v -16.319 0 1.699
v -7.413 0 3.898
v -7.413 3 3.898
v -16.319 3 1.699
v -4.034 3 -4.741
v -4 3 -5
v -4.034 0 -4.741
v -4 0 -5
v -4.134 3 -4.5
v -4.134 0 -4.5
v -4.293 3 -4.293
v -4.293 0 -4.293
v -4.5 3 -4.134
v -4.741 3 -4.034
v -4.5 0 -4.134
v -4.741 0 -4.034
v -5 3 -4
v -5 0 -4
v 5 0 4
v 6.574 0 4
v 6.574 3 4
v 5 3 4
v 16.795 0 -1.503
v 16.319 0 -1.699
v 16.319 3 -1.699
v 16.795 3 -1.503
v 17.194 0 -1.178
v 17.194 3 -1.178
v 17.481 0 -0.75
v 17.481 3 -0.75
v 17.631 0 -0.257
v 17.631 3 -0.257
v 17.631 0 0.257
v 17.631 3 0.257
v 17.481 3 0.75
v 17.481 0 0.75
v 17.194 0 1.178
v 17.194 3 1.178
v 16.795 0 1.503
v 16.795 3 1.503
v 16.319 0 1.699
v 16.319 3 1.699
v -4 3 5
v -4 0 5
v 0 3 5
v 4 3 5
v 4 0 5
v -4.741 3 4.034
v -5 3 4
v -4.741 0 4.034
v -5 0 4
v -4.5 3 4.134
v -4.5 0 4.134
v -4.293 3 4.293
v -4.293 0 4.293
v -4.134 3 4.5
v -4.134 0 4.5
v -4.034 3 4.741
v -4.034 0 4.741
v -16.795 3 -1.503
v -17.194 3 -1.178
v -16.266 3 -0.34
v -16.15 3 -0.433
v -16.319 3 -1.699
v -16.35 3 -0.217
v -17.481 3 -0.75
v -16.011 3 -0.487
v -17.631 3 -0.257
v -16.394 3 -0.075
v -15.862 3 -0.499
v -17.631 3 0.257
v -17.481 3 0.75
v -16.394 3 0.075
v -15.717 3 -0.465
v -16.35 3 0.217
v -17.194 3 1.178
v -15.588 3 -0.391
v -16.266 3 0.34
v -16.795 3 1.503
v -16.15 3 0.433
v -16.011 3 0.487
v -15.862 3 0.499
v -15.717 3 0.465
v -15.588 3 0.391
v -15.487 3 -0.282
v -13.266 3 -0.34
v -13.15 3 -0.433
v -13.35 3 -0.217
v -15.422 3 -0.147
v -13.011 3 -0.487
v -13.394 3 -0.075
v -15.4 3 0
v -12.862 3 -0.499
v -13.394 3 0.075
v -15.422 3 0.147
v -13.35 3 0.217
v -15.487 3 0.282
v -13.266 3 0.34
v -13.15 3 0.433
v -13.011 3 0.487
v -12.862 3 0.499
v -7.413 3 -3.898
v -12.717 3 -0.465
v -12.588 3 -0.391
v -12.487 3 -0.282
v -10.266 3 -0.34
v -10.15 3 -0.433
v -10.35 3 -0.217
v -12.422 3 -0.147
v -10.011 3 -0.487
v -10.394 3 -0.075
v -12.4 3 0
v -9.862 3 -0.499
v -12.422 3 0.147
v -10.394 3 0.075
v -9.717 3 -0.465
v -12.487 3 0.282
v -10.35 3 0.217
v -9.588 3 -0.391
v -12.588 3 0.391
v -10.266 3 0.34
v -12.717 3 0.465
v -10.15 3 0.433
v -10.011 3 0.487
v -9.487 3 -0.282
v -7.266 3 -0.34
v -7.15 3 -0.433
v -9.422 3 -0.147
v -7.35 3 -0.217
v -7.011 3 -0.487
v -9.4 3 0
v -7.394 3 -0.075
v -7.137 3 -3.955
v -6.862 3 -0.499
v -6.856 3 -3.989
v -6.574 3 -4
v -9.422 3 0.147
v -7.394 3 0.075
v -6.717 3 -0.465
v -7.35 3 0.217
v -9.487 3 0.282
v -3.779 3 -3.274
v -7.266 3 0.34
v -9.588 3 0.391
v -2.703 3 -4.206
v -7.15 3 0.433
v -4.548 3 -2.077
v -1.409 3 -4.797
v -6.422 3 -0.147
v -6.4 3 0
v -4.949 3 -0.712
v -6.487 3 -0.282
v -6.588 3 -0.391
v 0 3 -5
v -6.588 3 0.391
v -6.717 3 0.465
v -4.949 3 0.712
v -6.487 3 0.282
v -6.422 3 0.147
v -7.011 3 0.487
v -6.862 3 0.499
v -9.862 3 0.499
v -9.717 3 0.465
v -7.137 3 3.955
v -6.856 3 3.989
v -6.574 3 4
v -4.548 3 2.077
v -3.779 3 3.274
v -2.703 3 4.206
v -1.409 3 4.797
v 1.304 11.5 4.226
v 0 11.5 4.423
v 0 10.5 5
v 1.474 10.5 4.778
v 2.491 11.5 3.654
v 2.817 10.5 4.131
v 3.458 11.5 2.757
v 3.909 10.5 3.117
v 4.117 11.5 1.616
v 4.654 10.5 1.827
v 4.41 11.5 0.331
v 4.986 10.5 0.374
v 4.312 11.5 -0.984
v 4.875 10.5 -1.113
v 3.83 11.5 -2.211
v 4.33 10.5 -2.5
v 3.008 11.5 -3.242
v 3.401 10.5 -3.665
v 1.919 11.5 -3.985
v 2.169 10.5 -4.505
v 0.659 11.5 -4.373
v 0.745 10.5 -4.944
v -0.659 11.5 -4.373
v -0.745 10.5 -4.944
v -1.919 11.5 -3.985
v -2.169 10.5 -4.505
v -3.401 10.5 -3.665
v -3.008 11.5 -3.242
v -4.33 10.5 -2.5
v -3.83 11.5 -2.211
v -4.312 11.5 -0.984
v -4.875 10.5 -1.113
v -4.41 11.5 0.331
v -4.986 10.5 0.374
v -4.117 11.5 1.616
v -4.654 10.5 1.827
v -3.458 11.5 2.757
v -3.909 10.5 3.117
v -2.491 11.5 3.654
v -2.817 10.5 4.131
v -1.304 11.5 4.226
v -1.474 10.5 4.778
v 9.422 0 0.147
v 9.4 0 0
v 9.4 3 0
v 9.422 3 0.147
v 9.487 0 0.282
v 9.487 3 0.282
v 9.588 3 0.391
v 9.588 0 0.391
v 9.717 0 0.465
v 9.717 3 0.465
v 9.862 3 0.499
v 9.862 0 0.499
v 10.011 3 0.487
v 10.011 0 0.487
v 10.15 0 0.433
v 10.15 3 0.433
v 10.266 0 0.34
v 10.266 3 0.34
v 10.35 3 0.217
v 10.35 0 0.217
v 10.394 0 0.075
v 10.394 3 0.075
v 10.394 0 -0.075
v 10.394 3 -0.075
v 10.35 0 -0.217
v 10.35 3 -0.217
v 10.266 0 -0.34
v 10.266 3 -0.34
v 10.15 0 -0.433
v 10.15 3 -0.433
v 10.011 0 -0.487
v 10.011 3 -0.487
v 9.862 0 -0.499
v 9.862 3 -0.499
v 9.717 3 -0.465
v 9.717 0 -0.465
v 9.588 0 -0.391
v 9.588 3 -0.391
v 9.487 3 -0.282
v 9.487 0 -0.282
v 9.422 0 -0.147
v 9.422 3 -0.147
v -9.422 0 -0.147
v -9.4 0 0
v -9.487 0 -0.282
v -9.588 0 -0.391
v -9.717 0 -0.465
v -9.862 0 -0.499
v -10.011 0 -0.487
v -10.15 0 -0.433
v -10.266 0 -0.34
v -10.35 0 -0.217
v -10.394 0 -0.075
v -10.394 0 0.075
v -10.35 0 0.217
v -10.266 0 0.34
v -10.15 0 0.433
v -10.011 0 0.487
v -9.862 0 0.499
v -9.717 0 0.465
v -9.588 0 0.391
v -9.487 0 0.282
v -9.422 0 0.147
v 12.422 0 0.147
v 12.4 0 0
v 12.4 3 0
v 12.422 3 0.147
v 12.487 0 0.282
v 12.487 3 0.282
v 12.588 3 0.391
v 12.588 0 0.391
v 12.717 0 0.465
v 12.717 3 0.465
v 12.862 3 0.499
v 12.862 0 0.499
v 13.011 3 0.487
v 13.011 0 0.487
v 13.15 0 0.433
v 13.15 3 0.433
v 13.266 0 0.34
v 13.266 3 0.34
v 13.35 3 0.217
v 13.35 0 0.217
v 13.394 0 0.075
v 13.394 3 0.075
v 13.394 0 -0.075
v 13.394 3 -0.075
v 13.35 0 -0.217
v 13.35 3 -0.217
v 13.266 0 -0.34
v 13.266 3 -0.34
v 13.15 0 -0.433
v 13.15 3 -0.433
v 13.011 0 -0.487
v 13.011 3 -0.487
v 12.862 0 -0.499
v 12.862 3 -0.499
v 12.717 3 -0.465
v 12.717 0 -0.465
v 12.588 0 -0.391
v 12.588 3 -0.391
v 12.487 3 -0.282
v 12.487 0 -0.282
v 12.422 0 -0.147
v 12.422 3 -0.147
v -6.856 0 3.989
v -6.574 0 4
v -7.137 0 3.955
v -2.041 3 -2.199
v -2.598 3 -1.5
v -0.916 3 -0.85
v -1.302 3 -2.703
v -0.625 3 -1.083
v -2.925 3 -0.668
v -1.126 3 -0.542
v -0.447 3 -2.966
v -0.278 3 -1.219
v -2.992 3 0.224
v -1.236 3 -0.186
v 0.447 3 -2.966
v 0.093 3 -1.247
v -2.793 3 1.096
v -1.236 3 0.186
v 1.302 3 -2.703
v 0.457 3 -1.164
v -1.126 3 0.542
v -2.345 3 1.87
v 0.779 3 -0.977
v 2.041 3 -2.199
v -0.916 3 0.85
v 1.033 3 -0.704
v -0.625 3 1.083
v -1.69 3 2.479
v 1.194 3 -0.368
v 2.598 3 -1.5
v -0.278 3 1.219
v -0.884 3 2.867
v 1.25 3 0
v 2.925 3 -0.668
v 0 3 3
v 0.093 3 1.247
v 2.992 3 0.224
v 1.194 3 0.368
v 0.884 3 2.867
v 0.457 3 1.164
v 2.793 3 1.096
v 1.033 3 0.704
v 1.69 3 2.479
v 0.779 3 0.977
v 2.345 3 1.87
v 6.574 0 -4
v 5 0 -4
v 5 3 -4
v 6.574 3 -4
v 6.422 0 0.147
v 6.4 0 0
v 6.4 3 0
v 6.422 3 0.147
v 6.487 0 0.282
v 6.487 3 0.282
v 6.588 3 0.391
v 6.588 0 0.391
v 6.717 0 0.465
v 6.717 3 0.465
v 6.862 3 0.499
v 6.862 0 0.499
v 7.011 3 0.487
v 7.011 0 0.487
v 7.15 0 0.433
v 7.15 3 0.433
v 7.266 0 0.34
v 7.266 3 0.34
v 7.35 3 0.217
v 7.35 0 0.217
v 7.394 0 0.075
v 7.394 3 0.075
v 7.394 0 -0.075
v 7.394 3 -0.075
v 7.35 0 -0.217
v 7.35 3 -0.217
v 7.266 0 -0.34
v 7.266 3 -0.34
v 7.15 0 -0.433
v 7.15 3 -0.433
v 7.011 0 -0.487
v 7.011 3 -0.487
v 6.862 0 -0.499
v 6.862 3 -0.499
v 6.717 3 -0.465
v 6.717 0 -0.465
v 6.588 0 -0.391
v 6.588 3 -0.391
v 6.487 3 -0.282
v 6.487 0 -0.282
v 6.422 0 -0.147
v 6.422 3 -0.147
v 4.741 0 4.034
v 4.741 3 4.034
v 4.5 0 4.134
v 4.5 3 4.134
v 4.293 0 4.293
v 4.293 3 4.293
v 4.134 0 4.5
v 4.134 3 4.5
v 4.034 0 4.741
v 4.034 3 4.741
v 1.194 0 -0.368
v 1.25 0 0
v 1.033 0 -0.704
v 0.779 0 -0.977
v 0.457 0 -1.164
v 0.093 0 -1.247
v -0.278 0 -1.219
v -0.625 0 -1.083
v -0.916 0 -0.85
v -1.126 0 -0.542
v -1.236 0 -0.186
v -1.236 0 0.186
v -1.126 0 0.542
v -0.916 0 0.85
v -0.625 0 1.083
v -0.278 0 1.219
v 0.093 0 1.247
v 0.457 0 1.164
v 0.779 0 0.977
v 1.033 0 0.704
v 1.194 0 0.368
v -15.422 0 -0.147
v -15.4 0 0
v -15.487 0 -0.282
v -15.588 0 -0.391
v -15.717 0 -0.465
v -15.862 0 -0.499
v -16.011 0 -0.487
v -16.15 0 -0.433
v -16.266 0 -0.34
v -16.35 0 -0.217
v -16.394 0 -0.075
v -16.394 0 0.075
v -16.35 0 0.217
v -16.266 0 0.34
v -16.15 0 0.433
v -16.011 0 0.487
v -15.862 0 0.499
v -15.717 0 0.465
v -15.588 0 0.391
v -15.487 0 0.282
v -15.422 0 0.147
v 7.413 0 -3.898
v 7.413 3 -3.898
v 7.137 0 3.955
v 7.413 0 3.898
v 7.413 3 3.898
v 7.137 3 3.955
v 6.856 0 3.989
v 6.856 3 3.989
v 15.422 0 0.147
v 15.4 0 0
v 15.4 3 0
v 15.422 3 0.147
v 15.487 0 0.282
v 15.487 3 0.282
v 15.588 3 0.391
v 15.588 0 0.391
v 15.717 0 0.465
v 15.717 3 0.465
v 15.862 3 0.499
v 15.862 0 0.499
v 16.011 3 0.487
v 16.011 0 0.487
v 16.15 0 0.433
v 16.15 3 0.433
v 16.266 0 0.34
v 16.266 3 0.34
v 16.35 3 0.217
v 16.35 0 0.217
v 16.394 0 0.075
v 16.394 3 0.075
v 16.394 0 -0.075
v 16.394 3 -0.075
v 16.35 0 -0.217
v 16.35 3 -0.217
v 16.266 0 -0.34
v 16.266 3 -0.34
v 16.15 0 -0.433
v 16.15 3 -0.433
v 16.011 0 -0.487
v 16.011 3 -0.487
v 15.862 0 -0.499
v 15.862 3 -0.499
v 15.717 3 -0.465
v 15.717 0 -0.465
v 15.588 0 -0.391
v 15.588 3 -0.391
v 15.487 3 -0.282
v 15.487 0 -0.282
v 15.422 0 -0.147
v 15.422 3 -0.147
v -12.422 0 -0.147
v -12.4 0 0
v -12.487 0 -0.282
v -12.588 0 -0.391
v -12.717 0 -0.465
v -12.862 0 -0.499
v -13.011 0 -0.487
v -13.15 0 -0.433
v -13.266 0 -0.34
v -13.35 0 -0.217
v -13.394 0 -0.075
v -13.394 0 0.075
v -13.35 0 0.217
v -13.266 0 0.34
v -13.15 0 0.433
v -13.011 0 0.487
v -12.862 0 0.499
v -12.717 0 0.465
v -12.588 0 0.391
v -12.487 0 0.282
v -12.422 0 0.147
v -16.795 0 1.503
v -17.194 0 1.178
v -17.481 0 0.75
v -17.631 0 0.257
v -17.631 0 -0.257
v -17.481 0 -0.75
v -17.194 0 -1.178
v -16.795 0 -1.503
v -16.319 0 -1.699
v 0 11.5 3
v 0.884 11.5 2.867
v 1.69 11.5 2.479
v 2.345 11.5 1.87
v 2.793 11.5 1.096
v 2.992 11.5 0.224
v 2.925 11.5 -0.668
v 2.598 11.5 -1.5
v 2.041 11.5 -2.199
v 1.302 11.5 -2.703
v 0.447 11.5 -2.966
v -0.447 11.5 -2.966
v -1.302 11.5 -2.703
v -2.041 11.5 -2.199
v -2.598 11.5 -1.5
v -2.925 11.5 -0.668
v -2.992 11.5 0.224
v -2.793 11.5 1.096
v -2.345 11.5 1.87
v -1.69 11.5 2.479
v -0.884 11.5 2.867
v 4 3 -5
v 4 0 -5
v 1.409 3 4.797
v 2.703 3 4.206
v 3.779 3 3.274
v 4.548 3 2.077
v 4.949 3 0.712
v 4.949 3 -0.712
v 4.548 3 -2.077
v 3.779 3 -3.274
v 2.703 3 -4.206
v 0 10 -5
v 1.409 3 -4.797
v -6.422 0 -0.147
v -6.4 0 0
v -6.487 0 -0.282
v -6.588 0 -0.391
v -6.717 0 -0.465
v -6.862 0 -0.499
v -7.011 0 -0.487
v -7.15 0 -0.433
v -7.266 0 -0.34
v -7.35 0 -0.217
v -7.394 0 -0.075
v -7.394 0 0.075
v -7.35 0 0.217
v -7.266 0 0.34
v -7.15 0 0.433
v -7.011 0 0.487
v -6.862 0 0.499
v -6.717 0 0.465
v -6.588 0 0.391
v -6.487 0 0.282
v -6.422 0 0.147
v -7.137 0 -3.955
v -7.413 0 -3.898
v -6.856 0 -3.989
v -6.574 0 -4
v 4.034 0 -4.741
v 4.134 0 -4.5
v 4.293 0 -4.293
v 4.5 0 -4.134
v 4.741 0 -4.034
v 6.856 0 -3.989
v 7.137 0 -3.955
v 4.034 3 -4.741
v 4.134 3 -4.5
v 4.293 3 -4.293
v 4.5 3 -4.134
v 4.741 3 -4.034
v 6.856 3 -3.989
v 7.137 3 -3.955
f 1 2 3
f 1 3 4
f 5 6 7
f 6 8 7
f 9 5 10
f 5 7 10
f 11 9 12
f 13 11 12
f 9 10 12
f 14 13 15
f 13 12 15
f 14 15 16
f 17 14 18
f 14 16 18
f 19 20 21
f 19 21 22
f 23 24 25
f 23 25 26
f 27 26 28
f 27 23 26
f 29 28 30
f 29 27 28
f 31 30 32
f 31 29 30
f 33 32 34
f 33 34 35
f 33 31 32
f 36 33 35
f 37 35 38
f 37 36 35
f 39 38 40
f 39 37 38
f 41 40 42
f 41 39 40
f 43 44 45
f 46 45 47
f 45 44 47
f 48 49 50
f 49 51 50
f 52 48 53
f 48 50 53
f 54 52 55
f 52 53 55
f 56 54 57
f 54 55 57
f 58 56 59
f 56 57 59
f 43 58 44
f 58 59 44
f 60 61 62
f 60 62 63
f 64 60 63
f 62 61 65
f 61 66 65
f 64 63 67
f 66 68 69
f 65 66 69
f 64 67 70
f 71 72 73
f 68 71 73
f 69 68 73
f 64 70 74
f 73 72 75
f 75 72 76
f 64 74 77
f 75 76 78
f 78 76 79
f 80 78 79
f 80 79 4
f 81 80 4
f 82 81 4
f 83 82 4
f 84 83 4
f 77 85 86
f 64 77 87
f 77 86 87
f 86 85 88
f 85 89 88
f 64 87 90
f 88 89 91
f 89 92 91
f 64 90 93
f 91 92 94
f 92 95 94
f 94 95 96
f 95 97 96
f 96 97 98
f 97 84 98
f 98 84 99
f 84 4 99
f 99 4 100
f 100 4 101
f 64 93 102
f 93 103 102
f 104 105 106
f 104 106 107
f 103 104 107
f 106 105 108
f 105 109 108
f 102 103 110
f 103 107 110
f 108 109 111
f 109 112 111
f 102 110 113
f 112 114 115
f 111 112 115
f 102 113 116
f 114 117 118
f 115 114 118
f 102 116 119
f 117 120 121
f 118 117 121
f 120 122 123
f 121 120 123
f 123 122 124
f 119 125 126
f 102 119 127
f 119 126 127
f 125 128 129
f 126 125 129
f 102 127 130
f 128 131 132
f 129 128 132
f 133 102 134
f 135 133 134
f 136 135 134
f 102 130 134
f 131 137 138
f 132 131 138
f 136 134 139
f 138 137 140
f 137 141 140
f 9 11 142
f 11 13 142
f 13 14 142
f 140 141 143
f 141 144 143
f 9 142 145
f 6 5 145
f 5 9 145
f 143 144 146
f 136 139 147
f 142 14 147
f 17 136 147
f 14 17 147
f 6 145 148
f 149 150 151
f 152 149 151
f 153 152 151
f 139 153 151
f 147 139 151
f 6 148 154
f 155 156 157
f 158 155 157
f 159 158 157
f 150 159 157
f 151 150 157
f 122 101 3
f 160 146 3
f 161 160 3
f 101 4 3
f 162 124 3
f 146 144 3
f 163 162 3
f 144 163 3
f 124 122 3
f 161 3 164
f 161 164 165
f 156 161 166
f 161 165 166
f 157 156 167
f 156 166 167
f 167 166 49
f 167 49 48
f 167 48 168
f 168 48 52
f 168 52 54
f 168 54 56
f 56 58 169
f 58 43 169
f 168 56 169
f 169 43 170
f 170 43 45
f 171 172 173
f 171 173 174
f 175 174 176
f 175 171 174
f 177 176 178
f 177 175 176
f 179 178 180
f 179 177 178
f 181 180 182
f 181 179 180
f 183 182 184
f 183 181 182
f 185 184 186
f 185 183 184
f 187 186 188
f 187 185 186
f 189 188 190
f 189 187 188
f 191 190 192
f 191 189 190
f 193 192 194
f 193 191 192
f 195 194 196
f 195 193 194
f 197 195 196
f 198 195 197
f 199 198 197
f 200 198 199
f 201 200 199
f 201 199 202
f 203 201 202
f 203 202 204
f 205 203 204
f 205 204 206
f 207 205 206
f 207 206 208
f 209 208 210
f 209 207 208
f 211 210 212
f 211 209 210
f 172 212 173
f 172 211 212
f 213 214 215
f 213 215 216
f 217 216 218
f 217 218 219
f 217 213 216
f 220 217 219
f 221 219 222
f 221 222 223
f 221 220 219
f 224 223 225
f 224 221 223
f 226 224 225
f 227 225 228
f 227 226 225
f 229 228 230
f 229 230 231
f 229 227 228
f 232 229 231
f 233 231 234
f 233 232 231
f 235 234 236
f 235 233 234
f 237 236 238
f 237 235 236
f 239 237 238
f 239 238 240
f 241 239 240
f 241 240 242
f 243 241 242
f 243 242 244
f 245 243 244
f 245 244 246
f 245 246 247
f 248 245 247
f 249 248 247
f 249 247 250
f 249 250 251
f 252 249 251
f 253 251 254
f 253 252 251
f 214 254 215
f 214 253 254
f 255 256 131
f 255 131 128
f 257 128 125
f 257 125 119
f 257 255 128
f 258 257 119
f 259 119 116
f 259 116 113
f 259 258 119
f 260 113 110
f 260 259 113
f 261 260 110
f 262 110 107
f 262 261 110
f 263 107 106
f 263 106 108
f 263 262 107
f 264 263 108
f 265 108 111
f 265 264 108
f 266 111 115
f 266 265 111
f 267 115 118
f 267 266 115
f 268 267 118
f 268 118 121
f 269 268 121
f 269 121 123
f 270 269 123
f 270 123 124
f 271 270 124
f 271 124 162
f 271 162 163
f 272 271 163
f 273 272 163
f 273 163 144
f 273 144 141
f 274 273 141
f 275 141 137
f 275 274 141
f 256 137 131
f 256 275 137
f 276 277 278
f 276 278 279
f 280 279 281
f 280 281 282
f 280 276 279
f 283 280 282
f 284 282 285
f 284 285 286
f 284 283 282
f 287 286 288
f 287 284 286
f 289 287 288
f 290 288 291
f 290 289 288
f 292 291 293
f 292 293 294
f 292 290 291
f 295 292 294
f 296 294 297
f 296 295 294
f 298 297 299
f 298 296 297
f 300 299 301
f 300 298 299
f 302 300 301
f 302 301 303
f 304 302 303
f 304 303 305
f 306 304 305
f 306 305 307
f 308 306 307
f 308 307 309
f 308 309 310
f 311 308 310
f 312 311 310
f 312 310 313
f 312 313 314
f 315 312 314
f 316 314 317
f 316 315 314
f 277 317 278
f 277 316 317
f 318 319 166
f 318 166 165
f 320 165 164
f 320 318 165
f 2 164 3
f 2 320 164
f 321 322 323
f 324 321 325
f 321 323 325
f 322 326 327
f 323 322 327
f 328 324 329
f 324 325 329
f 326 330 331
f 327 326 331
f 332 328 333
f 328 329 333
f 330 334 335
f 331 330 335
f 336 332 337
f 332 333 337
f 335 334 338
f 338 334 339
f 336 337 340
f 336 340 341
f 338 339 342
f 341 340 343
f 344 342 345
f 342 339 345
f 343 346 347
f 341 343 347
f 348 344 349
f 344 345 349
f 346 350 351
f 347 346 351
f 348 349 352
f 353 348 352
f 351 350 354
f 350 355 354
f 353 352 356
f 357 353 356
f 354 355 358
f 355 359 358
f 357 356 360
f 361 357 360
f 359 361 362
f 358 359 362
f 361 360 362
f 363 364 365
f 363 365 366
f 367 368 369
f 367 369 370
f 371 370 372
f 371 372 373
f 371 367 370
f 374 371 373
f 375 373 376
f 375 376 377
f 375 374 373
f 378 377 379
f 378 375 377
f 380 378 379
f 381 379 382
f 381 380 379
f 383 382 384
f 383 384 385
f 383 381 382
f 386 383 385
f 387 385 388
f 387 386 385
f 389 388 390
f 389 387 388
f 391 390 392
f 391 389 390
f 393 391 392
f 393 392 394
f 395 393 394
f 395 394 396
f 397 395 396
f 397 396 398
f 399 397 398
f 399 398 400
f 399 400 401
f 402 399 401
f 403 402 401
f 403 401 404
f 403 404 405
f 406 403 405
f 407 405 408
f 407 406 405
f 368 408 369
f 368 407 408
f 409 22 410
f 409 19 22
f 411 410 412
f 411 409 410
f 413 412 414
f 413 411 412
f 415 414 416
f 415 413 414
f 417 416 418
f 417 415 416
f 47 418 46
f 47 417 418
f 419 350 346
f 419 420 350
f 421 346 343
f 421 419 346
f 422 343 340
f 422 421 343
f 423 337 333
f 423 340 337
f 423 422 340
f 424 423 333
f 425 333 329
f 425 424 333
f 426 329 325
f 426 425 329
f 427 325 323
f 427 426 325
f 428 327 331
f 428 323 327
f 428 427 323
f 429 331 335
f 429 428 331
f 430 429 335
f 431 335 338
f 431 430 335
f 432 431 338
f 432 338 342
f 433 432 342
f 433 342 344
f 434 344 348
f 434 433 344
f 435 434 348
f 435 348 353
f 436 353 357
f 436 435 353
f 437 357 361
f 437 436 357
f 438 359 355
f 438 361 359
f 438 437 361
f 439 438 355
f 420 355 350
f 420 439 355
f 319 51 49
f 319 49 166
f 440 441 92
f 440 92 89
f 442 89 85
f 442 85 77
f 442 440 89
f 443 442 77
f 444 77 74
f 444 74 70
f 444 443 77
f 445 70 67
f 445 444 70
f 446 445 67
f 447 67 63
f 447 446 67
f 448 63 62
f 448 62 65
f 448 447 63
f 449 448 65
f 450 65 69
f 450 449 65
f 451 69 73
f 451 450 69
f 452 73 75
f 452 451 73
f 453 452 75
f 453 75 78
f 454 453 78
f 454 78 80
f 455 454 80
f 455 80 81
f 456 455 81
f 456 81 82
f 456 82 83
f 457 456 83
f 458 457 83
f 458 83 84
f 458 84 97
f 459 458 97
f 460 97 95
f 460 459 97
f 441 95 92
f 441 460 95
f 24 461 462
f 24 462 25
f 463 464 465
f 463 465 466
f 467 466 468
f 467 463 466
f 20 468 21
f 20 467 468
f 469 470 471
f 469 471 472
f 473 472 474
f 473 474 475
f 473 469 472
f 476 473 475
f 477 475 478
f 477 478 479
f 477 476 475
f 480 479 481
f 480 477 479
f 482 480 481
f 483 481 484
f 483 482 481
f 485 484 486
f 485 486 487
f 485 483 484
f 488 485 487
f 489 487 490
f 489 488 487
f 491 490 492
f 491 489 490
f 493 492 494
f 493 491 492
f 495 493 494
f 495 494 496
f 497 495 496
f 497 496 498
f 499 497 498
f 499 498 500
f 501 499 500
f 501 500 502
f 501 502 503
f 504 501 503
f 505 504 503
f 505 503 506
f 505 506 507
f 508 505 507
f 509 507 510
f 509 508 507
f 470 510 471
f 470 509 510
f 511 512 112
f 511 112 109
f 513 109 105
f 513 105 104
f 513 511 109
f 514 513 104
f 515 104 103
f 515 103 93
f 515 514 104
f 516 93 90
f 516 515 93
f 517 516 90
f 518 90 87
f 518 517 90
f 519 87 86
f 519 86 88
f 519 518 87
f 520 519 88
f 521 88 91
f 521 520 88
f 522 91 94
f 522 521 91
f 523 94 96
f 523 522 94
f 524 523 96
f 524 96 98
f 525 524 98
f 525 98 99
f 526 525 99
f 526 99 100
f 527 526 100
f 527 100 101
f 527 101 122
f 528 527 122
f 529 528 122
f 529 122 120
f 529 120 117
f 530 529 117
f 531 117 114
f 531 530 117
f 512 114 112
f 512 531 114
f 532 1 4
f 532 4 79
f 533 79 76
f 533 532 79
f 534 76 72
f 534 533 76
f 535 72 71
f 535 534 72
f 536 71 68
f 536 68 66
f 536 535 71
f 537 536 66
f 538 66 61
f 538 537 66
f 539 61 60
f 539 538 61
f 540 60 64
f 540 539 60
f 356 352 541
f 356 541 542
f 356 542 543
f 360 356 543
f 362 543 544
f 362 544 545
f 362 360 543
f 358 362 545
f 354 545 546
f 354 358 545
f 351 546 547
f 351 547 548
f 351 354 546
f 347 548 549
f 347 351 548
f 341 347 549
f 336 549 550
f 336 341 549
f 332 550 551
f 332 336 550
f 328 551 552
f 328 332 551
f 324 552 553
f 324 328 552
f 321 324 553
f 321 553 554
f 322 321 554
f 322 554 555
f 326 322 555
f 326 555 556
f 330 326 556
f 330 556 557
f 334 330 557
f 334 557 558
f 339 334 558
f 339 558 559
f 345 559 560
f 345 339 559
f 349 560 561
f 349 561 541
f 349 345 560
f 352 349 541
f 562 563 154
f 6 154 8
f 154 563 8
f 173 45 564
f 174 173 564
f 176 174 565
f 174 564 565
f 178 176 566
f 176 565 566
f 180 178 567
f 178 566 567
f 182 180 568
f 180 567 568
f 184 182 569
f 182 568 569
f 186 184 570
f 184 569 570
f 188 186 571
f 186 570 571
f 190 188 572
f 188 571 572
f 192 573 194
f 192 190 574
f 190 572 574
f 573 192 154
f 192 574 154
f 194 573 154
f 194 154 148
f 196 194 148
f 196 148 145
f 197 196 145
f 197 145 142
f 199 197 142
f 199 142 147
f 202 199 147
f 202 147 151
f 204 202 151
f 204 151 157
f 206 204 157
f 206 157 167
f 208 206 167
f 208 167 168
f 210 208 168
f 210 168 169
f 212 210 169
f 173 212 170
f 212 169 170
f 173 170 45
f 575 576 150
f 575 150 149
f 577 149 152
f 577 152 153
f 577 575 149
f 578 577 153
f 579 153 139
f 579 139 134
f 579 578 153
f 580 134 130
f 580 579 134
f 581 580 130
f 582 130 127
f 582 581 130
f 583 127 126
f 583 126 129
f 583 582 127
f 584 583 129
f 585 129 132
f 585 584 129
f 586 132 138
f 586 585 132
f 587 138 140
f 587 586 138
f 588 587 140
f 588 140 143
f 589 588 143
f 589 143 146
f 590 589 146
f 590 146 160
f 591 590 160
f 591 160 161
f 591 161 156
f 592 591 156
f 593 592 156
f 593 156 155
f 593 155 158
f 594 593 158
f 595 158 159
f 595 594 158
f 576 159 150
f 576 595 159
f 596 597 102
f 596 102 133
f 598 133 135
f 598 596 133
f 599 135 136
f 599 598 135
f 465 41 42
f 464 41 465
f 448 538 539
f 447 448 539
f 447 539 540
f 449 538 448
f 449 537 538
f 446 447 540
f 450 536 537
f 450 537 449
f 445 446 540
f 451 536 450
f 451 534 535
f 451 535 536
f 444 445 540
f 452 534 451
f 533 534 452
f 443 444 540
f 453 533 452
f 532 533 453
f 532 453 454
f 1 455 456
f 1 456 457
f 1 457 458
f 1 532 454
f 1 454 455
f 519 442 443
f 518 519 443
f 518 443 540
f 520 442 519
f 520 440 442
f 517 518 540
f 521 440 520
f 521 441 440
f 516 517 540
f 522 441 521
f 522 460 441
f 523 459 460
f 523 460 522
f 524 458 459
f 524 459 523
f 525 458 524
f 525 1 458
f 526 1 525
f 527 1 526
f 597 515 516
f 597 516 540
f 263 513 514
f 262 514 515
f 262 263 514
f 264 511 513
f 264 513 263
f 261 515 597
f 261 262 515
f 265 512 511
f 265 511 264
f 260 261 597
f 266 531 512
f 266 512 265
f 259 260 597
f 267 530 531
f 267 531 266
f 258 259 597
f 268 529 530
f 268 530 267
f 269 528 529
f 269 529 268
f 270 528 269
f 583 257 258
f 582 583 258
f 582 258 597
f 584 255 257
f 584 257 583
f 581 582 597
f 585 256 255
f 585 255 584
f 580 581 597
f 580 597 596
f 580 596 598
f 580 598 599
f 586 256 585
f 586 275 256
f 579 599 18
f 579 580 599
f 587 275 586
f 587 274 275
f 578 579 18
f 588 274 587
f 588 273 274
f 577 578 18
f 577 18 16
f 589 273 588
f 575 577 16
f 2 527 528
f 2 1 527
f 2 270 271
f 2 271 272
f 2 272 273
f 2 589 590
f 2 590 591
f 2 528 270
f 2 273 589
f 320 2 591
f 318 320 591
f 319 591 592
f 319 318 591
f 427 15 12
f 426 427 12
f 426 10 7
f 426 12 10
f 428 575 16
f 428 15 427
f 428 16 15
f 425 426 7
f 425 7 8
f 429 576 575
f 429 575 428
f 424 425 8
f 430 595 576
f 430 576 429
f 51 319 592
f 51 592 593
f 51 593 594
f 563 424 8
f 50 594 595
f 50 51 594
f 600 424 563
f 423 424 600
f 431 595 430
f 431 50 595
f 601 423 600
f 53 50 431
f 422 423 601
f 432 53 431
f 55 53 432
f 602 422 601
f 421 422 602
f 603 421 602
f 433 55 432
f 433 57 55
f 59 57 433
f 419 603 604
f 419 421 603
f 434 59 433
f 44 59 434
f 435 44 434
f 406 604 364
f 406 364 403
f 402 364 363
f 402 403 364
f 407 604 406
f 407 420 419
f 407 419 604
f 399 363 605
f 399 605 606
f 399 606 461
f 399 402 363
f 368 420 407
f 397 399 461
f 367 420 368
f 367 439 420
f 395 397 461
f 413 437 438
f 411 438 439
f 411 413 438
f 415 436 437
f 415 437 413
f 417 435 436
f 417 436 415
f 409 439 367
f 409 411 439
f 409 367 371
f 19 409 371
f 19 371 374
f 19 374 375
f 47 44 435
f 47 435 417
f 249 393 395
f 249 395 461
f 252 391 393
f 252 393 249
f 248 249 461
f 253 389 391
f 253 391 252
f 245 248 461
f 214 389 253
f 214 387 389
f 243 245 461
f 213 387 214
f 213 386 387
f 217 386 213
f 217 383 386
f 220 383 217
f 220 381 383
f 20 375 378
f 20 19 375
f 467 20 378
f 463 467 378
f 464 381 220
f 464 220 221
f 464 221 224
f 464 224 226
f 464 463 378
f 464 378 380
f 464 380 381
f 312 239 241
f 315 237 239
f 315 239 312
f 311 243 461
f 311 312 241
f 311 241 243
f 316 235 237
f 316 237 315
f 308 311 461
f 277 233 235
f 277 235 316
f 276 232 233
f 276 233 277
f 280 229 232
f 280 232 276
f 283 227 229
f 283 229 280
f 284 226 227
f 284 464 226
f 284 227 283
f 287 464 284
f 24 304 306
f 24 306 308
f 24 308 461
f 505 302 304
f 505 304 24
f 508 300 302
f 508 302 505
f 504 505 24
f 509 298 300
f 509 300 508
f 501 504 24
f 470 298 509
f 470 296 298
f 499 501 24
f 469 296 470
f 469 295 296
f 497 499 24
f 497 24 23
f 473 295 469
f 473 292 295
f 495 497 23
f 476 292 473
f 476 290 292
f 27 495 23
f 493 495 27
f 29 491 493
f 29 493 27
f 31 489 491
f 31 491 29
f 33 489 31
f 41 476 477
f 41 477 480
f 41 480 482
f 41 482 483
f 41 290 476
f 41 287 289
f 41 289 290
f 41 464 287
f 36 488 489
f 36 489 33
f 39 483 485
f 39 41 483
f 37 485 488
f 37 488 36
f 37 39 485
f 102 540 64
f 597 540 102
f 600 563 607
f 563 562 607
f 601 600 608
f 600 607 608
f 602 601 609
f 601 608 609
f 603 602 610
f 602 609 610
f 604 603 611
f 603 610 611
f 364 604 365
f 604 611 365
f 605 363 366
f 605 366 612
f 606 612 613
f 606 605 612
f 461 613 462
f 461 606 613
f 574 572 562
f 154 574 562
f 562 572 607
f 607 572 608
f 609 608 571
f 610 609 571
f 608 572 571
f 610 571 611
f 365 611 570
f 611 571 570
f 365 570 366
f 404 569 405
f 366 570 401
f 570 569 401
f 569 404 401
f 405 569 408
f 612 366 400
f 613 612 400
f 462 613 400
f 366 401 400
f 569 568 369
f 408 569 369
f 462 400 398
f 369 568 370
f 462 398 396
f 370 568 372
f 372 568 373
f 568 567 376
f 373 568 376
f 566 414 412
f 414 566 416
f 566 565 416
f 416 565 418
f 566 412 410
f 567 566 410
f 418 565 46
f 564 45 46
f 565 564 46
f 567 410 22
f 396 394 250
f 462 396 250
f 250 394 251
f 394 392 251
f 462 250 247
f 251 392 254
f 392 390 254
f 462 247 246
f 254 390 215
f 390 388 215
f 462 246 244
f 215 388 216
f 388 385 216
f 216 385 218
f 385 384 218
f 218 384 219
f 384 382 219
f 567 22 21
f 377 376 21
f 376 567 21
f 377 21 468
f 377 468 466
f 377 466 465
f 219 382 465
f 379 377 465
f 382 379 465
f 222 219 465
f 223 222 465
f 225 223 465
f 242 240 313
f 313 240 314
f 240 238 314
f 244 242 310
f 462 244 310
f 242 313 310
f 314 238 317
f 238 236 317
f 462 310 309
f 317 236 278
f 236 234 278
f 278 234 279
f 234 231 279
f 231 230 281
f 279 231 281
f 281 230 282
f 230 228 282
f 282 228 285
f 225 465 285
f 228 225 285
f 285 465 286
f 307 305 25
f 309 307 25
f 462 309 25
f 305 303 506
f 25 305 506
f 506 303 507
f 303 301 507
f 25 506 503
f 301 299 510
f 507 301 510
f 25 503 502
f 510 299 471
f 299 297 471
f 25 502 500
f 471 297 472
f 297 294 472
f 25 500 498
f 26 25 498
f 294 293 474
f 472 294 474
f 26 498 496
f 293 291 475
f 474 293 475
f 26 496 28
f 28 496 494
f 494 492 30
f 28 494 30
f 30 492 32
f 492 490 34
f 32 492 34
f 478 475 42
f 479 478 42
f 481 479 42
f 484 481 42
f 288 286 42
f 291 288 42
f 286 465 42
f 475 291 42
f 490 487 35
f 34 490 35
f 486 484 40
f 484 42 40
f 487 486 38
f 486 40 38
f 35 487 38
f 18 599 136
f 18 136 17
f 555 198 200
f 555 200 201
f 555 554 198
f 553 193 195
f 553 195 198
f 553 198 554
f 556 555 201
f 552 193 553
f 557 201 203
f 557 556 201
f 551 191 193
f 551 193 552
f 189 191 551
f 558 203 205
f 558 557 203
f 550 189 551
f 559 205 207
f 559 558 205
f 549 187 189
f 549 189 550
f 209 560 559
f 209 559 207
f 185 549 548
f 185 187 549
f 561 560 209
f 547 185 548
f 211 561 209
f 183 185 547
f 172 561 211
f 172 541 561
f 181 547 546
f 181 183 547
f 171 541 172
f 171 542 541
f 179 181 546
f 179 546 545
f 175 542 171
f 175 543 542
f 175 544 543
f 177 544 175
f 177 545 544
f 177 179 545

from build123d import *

# Parameters (mm, degrees)
CROQUIS1_R              = 0.5
SALIENTE_EXTRUIR1_DEPTH = 3
MATRIZC1_COUNT          = 4
CROQUIS2_R              = 5
CROQUIS2_R_2            = 3
SALIENTE_EXTRUIR2_DEPTH = 8.5
CHAFL_N1_SIZE           = 1
CHAFL_N1_SIZE2          = 0.577350269
REDONDEO1_R             = 1
CUT_EXTRUDE1_DEPTH      = 10


with BuildPart() as part:
    # Croquis1 → Saliente-Extruir1 (new body)
    with BuildSketch(Plane(origin=(0, 0, 0), x_dir=(1, 0, 0), z_dir=(0, 1, 0))):
        with BuildLine():
            Line((-4, 0), (-4, 6.574293681))
            ThreePointArc((-4, 6.574293681), (-3.974394349, 6.996885575), (-3.897952052, 7.413294188))
            Line((-3.897952052, 7.413294188), (-1.698976026, 16.319147094))
            ThreePointArc((-1.698976026, 16.319147094), (0, 17.649646841), (1.698976026, 16.319147094))
            Line((1.698976026, 16.319147094), (3.897952052, 7.413294188))
            ThreePointArc((3.897952052, 7.413294188), (3.974394349, 6.996885575), (4, 6.574293681))
            Line((4, 6.574293681), (4, 0))
            Line((4, 0), (1.25, 0))
            ThreePointArc((1.25, 0), (0, 1.25), (-1.25, 0))
            Line((-1.25, 0), (-4, 0))
        make_face()
        with Locations(Location((0, 15.899646841, 0), (0, 0, 270))):
            Circle(CROQUIS1_R, mode=Mode.SUBTRACT)
        with Locations(Location((0, 12.899646841, 0), (0, 0, 270))):
            Circle(CROQUIS1_R, mode=Mode.SUBTRACT)
        with Locations(Location((0, 9.899646841, 0), (0, 0, 270))):
            Circle(CROQUIS1_R, mode=Mode.SUBTRACT)
        with Locations(Location((0, 6.899646841, 0), (0, 0, 270))):
            Circle(CROQUIS1_R, mode=Mode.SUBTRACT)
    saliente_extruir1 = extrude(amount=SALIENTE_EXTRUIR1_DEPTH)

    # MatrizC1: Saliente-Extruir1 ×4 about axis
    matrizc1_axis = Axis((0, 0, 0), (0, 1, 0))
    for i in range(1, MATRIZC1_COUNT):
        add(saliente_extruir1.rotate(matrizc1_axis, i * 360 / MATRIZC1_COUNT))

    # Croquis2 → Saliente-Extruir2 (add)
    with BuildSketch(Plane(origin=(0, 3, 0), x_dir=(1, 0, 0), z_dir=(0, 1, 0))):
        with Locations(Location((0, 0, 0), (0, 0, 270))):
            Circle(CROQUIS2_R)
        with Locations(Location((0, 0, 0), (0, 0, 270))):
            Circle(CROQUIS2_R_2, mode=Mode.SUBTRACT)
    extrude(amount=SALIENTE_EXTRUIR2_DEPTH)

    # Chaflán1
    chafl_n1_edges = [part.edges().sort_by_distance(p)[0] for p in [
        (0, 11.5, -5),
    ]]
    chafl_n1_side = [part.faces().sort_by_distance(p)[0] for p in [
        (0, 7.25, -5),
    ]]
    chamfer(chafl_n1_edges, length=CHAFL_N1_SIZE, length2=CHAFL_N1_SIZE2, reference=chafl_n1_side[0])

    # Redondeo1
    redondeo1_edges = [part.edges().sort_by_distance(p)[0] for p in [
        (-4, 1.5, -4),
        (4, 1.5, -4),
        (4, 1.5, 4),
        (-4, 1.5, 4),
    ]]
    fillet(redondeo1_edges, radius=REDONDEO1_R)

    # Sketch1 → Cut-Extrude1 (cut)
    with BuildSketch(Plane.XZ):
        Polygon((4, 5), (-4, 5), (-4, 20.808082072), (5.438258964, 20.808082072), (5.438258964, 5), align=None)
        Polygon((5.438258964, -5), (4, -5), (-4, -5), (-4, -20.808082072), (5.438258964, -20.808082072), align=None)
    extrude(amount=-CUT_EXTRUDE1_DEPTH, mode=Mode.SUBTRACT)


solid = part.part
